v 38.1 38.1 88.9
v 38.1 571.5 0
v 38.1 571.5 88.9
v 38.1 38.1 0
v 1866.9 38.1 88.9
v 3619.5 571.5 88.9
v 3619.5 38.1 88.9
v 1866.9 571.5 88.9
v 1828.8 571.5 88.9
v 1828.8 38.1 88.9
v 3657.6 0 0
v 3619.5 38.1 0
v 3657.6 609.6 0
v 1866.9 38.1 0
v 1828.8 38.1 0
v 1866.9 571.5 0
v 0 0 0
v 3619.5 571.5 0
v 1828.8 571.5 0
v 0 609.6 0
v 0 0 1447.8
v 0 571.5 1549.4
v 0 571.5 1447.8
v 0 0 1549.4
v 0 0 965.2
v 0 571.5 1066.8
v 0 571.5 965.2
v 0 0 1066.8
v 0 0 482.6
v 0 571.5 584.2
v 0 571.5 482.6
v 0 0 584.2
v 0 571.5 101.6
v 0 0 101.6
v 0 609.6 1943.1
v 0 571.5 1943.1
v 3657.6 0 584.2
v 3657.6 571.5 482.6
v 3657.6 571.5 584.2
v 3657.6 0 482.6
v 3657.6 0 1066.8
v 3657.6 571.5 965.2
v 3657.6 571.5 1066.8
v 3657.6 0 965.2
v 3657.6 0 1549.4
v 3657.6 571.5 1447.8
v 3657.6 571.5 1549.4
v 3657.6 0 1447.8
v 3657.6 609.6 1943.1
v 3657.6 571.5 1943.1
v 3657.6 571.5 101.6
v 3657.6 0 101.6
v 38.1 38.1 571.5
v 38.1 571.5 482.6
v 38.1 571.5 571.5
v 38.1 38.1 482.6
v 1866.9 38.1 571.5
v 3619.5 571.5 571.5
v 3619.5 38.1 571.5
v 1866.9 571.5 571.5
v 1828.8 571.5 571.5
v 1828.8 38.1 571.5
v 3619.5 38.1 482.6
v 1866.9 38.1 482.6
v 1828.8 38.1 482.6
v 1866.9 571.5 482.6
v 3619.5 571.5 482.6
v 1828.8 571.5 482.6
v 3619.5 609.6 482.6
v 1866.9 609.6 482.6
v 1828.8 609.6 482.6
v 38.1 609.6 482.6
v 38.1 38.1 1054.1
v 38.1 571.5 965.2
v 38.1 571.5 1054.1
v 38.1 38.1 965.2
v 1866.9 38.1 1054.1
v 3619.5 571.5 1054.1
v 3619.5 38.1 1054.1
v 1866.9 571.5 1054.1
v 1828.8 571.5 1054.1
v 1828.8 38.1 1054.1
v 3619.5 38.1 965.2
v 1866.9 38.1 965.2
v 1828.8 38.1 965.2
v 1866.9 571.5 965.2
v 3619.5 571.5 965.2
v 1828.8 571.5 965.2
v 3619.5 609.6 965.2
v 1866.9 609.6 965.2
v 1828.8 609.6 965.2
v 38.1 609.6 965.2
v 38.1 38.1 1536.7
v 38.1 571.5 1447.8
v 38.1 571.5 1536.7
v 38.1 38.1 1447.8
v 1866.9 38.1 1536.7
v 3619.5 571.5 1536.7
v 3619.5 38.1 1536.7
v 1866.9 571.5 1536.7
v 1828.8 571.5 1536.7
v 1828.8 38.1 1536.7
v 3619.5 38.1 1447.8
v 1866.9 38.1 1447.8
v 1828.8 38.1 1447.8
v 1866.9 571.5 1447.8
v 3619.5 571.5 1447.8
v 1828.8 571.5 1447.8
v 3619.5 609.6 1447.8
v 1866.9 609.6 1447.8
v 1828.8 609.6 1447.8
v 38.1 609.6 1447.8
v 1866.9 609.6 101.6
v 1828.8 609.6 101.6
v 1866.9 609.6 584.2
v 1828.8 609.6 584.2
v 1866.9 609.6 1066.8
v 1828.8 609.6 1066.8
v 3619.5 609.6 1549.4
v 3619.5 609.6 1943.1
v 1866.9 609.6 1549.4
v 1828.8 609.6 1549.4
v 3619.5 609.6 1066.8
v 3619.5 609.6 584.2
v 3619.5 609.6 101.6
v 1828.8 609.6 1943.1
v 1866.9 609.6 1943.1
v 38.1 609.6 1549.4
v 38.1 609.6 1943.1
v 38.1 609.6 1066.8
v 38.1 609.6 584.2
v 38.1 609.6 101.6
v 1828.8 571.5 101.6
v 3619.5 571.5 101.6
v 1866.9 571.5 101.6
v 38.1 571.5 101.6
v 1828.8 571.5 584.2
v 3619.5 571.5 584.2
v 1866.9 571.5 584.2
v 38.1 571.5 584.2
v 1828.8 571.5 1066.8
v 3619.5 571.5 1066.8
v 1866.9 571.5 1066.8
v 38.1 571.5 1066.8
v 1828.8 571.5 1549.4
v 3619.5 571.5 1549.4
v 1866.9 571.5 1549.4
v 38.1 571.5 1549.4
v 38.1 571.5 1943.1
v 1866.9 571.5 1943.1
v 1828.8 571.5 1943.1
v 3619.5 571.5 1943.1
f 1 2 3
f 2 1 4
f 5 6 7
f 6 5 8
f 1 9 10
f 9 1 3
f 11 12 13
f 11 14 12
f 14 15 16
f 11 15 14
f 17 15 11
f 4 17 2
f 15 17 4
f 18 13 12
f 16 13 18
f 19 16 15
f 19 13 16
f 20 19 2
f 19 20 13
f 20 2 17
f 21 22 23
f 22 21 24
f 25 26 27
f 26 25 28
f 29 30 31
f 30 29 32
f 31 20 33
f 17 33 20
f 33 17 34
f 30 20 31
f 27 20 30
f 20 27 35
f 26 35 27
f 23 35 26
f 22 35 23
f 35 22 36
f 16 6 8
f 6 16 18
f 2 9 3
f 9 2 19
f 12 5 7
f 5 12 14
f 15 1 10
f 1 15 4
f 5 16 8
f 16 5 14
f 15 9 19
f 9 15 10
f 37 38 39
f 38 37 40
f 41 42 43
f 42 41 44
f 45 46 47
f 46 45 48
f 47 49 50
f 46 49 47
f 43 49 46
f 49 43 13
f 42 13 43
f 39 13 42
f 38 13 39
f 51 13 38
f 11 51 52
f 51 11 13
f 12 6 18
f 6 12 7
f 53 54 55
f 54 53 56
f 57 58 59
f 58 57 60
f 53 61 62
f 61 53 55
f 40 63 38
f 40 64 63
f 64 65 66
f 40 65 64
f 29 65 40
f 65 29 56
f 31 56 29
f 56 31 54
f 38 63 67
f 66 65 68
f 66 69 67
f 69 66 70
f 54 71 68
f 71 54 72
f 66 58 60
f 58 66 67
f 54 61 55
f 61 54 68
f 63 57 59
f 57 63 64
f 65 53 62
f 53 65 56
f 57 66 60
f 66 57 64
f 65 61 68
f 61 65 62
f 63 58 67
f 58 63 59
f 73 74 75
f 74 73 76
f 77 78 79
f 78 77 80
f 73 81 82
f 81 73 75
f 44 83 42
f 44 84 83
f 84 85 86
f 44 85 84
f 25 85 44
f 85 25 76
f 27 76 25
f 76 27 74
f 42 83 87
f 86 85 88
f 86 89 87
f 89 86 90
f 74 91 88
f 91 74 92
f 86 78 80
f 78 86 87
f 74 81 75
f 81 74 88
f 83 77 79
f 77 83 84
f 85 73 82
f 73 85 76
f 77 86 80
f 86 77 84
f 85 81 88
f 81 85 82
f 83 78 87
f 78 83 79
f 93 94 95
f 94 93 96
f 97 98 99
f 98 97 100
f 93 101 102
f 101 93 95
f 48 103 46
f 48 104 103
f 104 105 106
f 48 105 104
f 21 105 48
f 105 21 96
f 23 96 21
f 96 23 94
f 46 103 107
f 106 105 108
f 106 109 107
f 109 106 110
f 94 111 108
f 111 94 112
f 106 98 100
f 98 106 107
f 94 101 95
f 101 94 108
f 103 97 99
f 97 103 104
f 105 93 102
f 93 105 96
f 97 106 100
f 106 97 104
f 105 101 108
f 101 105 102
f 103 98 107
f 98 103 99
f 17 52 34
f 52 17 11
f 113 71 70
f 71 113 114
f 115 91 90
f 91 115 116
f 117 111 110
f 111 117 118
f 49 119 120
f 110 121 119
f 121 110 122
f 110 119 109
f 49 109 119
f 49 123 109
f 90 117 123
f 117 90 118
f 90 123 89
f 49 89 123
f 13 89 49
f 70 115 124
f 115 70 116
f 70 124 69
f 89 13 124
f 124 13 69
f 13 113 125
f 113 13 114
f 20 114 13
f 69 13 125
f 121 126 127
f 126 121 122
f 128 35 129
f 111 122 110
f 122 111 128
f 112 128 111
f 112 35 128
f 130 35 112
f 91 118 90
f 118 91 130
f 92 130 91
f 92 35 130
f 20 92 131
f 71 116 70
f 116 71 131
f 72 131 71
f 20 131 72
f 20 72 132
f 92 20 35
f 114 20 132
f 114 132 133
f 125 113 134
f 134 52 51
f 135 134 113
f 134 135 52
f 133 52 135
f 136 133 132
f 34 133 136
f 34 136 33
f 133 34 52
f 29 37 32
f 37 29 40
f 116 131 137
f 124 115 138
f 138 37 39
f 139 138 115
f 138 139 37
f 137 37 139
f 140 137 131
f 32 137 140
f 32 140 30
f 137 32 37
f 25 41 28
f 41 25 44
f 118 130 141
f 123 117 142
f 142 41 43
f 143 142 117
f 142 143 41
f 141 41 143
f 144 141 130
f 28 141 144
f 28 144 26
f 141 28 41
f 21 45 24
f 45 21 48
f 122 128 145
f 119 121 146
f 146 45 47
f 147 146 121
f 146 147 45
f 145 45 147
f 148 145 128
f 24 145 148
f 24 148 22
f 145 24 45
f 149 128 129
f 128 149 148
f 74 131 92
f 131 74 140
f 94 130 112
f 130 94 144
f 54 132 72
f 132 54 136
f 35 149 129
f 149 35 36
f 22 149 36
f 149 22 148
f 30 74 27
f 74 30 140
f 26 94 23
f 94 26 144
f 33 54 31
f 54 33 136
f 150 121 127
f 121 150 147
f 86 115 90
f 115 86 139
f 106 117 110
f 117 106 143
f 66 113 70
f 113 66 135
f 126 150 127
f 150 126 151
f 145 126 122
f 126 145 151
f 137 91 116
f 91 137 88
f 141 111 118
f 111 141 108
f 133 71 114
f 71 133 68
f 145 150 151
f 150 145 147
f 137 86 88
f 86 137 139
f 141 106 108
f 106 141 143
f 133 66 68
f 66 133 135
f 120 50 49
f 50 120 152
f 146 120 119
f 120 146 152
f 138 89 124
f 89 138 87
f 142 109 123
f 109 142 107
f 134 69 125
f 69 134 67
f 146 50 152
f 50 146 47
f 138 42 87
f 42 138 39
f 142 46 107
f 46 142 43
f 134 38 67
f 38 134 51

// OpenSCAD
// Parametric wall-backed garage shelving model, units in millimeters.

length = 3657.6;
depth = 609.6;
height = 1943.1;
two_by_four_w = 38.1;
two_by_four_h = 88.9;
ply = 12.7;
cross_support = 533.4;
panel_long = 2438.4;
panel_short = 1219.2;
shelf_z = [0, 482.6, 965.2, 1447.8];
post_x = [0, length / 2, length - two_by_four_w];

module board(pos, size, color_value=[0.72, 0.49, 0.25]) {
  color(color_value) translate(pos) cube(size);
}

for (z = shelf_z) {
  board([0, 0, z], [length, two_by_four_w, two_by_four_h]);
  board([0, depth - two_by_four_w, z], [length, two_by_four_w, two_by_four_h]);

  for (x = post_x) {
    board([x, two_by_four_w, z], [two_by_four_w, cross_support, two_by_four_h]);
  }

  board([0, 0, z + two_by_four_h], [panel_long, depth, ply], [0.69, 0.58, 0.36]);
  board([panel_long, 0, z + two_by_four_h], [panel_short, depth, ply], [0.69, 0.58, 0.36]);
}

for (x = post_x) {
  board([x, depth - two_by_four_w, 0], [two_by_four_w, two_by_four_w, height]);
}
